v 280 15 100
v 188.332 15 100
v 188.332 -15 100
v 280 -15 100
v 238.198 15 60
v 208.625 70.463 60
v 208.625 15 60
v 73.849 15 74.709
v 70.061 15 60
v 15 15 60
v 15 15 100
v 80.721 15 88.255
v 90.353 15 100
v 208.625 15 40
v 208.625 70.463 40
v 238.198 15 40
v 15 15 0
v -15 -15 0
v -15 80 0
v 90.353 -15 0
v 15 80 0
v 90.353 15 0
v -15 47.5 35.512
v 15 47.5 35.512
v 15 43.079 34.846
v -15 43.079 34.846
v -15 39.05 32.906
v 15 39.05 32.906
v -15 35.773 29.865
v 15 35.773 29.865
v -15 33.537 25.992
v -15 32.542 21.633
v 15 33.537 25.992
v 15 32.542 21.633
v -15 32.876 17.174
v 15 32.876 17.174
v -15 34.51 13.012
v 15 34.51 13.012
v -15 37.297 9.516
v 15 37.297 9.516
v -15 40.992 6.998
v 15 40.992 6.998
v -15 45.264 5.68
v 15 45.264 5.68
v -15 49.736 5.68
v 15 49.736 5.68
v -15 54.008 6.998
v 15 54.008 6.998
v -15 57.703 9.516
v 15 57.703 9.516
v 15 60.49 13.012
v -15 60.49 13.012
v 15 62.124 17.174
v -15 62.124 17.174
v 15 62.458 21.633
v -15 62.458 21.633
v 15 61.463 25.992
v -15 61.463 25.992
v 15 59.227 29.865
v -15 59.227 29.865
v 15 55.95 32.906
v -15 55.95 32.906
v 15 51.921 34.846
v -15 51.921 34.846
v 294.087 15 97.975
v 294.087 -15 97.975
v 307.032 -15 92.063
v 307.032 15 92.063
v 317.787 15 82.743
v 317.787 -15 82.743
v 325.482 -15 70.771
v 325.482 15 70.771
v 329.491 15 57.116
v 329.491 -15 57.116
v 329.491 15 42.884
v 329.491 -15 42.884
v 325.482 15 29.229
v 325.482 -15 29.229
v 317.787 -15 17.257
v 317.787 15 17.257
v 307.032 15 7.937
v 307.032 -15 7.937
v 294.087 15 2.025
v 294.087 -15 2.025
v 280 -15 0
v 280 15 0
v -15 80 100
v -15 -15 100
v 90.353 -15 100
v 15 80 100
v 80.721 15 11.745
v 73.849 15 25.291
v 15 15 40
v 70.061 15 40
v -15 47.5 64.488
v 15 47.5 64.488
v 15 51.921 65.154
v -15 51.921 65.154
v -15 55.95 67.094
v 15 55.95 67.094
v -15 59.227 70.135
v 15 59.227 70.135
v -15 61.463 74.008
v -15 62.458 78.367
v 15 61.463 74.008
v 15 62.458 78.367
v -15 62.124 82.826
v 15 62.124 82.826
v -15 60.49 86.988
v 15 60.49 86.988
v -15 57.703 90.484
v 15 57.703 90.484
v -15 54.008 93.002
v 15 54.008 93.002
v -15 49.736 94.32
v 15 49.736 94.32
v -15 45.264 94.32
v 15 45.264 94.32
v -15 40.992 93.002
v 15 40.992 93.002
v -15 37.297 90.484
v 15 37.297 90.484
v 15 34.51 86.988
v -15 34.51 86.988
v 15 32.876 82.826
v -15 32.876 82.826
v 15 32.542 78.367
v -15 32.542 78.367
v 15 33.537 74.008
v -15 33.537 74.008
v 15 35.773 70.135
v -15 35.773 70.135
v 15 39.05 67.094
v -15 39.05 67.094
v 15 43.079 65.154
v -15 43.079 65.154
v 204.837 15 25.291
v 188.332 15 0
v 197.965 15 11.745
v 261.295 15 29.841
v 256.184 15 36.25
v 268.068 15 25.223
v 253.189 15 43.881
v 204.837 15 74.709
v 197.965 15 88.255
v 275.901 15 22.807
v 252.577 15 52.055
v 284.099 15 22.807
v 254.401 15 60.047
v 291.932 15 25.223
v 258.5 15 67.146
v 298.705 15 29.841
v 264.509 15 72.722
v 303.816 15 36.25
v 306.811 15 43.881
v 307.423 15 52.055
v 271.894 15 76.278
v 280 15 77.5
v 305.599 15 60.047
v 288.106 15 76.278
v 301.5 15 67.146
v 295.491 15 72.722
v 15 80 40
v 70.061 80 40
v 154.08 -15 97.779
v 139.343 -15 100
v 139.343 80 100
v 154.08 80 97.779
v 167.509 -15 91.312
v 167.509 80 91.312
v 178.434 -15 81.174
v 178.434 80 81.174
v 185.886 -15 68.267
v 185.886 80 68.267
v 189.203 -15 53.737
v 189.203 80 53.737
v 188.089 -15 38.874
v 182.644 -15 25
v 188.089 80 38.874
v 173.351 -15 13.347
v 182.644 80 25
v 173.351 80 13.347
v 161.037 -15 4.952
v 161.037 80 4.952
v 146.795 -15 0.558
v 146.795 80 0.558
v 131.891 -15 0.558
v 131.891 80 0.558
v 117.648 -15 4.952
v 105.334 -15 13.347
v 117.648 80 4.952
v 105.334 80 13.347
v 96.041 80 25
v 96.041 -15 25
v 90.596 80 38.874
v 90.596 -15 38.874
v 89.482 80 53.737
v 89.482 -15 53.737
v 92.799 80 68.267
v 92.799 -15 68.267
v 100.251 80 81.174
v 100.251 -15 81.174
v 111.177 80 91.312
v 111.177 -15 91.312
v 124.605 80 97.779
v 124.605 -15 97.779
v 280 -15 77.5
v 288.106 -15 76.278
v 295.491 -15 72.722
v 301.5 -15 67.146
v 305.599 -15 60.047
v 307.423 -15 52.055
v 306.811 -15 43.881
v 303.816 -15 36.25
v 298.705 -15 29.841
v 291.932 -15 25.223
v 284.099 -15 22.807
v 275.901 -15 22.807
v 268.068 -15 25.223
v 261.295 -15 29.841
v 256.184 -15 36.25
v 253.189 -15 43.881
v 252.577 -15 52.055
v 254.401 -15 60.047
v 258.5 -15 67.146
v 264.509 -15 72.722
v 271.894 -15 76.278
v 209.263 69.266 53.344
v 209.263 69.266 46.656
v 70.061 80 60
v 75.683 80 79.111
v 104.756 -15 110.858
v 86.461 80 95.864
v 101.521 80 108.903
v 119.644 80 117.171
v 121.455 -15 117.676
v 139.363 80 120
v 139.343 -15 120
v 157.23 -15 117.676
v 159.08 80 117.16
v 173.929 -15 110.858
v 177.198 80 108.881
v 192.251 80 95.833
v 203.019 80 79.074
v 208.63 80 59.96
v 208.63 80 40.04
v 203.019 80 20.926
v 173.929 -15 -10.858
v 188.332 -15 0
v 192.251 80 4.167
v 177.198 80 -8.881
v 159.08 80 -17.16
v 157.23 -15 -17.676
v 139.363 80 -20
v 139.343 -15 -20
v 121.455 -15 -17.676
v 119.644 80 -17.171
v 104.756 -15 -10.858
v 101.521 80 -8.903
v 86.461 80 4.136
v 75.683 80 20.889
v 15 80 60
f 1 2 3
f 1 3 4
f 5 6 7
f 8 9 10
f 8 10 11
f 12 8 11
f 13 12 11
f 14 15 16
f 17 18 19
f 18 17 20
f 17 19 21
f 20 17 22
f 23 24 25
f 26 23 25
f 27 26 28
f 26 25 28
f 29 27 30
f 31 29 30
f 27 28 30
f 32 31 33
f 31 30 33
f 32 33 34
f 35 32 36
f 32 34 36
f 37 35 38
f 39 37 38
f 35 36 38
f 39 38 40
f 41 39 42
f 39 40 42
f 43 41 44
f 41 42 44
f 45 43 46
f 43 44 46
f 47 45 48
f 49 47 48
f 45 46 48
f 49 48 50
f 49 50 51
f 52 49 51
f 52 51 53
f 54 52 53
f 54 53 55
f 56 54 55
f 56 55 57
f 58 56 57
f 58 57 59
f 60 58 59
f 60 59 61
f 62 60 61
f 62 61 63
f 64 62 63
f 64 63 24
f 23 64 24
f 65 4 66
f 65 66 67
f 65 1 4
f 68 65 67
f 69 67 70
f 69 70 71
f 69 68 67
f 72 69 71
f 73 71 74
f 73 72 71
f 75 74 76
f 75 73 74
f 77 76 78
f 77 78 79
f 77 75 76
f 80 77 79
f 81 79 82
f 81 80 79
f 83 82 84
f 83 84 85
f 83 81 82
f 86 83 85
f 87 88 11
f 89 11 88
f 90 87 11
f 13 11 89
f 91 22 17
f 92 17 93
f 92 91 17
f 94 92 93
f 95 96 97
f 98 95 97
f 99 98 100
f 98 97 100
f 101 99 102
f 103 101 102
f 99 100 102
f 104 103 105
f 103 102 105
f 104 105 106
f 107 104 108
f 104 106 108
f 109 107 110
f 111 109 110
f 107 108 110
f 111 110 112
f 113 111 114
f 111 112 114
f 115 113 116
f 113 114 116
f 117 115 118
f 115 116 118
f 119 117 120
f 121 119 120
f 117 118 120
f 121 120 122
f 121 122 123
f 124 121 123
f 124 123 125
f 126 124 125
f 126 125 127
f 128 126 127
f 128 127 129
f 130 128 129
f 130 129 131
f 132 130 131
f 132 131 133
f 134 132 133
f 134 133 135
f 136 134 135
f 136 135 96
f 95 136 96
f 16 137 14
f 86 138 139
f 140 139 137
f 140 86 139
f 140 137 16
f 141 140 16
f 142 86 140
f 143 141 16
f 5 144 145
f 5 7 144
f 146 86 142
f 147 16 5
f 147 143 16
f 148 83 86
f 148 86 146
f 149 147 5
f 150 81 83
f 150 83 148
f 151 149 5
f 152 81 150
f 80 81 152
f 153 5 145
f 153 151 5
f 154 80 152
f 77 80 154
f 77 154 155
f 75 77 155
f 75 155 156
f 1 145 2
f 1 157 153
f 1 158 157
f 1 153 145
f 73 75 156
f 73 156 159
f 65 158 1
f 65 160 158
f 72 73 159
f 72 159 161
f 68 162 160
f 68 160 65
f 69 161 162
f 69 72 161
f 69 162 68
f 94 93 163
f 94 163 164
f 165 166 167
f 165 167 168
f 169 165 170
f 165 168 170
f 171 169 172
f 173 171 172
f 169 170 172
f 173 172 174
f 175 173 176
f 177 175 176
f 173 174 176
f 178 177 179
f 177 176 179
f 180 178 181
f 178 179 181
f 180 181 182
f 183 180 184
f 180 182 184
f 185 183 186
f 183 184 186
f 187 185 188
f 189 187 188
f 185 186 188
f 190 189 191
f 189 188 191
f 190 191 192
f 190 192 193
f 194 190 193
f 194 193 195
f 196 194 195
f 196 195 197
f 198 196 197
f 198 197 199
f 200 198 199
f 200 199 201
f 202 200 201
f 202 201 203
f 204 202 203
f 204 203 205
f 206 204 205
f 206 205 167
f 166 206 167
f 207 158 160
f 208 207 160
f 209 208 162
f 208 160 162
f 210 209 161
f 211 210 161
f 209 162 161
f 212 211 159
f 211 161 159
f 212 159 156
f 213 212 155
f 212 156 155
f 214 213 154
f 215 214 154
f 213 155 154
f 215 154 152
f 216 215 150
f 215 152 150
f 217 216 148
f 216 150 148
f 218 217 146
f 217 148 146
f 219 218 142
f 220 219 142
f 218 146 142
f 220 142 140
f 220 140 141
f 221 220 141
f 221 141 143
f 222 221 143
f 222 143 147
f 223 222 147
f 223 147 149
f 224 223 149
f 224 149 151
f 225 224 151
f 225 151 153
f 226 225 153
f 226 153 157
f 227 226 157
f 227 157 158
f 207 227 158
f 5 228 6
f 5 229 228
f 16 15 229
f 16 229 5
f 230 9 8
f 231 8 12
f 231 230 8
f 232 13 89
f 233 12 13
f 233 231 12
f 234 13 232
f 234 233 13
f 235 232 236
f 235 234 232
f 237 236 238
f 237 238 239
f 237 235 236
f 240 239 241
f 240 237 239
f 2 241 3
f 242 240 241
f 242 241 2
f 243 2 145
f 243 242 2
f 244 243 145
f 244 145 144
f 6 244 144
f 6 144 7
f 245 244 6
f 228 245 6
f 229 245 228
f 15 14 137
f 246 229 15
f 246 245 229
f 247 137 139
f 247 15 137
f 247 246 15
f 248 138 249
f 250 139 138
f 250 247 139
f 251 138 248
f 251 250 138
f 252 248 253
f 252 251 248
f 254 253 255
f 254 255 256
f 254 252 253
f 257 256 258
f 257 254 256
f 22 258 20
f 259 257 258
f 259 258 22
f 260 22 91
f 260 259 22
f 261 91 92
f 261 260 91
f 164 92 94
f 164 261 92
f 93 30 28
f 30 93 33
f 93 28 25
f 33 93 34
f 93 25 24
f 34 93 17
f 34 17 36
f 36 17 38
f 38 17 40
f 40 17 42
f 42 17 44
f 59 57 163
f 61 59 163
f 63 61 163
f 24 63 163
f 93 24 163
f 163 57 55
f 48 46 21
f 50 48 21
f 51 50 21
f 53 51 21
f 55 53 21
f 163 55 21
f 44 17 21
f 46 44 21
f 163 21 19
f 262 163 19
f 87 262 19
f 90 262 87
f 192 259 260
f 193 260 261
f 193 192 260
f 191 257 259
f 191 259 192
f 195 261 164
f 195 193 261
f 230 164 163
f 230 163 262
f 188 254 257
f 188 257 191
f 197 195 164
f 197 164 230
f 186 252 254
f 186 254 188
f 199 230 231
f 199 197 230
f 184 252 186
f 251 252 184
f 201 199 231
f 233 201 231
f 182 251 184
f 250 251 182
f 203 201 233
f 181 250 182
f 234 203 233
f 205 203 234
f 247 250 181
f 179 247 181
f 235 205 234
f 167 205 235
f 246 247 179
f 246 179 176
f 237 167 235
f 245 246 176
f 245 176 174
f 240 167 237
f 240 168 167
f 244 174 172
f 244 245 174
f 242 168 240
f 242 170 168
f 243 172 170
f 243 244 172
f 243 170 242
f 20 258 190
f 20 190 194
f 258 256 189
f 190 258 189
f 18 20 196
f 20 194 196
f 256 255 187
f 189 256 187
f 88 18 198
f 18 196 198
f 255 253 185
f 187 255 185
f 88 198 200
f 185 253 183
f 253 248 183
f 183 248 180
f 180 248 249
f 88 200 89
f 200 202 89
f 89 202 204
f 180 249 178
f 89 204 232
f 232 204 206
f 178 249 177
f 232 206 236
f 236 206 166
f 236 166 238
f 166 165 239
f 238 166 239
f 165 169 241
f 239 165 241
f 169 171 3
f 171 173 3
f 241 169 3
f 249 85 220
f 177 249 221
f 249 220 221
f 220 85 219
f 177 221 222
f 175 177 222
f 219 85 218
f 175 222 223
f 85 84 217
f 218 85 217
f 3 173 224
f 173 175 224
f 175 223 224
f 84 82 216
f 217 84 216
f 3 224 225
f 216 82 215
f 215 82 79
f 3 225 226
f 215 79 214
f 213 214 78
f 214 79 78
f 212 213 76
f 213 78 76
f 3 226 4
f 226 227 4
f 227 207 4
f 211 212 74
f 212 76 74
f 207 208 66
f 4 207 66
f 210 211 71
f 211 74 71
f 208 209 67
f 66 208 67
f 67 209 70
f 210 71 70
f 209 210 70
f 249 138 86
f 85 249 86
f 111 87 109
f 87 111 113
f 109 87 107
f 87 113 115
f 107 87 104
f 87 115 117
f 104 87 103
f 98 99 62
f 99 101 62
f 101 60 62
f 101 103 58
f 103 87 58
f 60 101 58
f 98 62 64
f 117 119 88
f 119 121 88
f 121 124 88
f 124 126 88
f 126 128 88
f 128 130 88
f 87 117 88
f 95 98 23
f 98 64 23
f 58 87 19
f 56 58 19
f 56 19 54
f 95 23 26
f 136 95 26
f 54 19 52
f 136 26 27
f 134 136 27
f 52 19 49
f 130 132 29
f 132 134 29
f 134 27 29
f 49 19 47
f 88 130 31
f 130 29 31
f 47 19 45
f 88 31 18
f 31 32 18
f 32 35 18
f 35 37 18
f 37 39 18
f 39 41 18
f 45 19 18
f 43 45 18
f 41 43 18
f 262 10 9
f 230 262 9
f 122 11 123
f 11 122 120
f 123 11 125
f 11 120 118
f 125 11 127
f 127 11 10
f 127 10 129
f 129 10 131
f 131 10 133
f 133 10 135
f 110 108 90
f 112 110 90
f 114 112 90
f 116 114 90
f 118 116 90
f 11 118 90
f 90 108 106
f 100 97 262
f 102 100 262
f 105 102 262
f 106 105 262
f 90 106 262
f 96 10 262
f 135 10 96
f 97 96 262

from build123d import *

# Parameters (mm, degrees)
EXTRUDE_THIN1_DEPTH      = 100
SKETCH2_W                = 50
SKETCH2_H                = 30
REVOLVE1_ANGLE           = 180
SKETCH3_R                = 27.5
CUT_EXTRUDE1_DEPTH       = 351.89172119
CUT_EXTRUDE1_DEPTH_BACK  = 351.89172119
SKETCH4_R                = 70
BOSS_EXTRUDE1_DEPTH      = 65
BOSS_EXTRUDE1_DEPTH_BACK = 30
SKETCH5_R                = 50
CUT_EXTRUDE2_DEPTH       = 364.765034054
SKETCH6_R                = 15
CUT_EXTRUDE3_DEPTH       = 347.446244026
RIB1_REACH               = 348.699
SKETCH8_WALL_W           = 749.740096374
SKETCH8_WALL_H           = 20
RIB23_REACH              = 348.699
SKETCH15_WALL_W          = 778.361425474
SKETCH15_WALL_H          = 20


with BuildPart() as part:
    # Sketch1 → Extrude-Thin1 (new body)
    with BuildSketch(Plane.XY):
        Polygon((-15, 80), (-15, -15), (280, -15), (280, 15), (15, 15), (15, 80), align=None)
    extrude(amount=EXTRUDE_THIN1_DEPTH)

    # Sketch2 → Revolve1 (revolve)
    with BuildSketch(Plane(origin=(280, 0, 0), x_dir=(0, 0, -1), z_dir=(1, 0, 0))):
        with Locations((-75, 0)):
            Rectangle(SKETCH2_W, SKETCH2_H)
    revolve(axis=Axis((280, 15, 50), (0, 1, 0)), revolution_arc=REVOLVE1_ANGLE)

    # Sketch3 → Cut-Extrude1 (cut, two sides)
    with BuildSketch(Plane(origin=(0, 15, 0), x_dir=(1, 0, 0), z_dir=(0, 1, 0))) as cut_extrude1_sk:
        with Locations(Location((280, -50, 0), (0, 0, 270))):
            Circle(SKETCH3_R)
    extrude(amount=CUT_EXTRUDE1_DEPTH, mode=Mode.SUBTRACT)
    extrude(cut_extrude1_sk.sketch, amount=-CUT_EXTRUDE1_DEPTH_BACK, mode=Mode.SUBTRACT)

    # Sketch4 → Boss-Extrude1 (add, two sides)
    with BuildSketch(Plane(origin=(0, 15, 0), x_dir=(1, 0, 0), z_dir=(0, 1, 0))) as boss_extrude1_sk:
        with Locations(Location((139.34266344, -50, 0), (0, 0, 270))):
            Circle(SKETCH4_R)
    extrude(amount=BOSS_EXTRUDE1_DEPTH)
    extrude(boss_extrude1_sk.sketch, amount=-BOSS_EXTRUDE1_DEPTH_BACK)

    # Sketch5 → Cut-Extrude2 (cut, through all)
    with BuildSketch(Plane(origin=(0, 80, 0), x_dir=(1, 0, 0), z_dir=(0, 1, 0))):
        with Locations(Location((139.34266344, -50, 0), (0, 0, 270))):
            Circle(SKETCH5_R)
    extrude(amount=-CUT_EXTRUDE2_DEPTH, mode=Mode.SUBTRACT)

    # Sketch6 → Cut-Extrude3 (cut, through all)
    with BuildSketch(Plane(origin=(15, 0, 0), x_dir=(0, 0, -1), z_dir=(1, 0, 0))):
        with Locations((-79.487733911, 47.5)):
            Circle(SKETCH6_R)
        with Locations(Location((-20.512266089, 47.5, 0), (0, 0, 180))):
            Circle(SKETCH6_R)
    extrude(amount=-CUT_EXTRUDE3_DEPTH, mode=Mode.SUBTRACT)

    # Sketch8 wall → Rib1 (add, up to next)
    with BuildSketch(Plane(origin=(42.17133172, 80, 50), x_dir=(1, 0, 0), z_dir=(0, 1, 0)), mode=Mode.PRIVATE) as rib1_sk1:
        Rectangle(SKETCH8_WALL_W, SKETCH8_WALL_H)
    rib1_tool1 = extrude(rib1_sk1.sketch, amount=-RIB1_REACH, mode=Mode.PRIVATE) - part.part
    add(rib1_tool1.solids().sort_by_distance((42.17133172, 80, 50))[0])

    # Sketch15 wall → Rib23 (add, up to next)
    with BuildSketch(Plane(origin=(223.056644771, 43.396320835, 50), x_dir=(0.470501542113, -0.88239917207, 0), z_dir=(0.88239917207, 0.470501542113, 0)), mode=Mode.PRIVATE) as rib23_sk1:
        Rectangle(SKETCH15_WALL_W, SKETCH15_WALL_H)
    rib23_tool1 = extrude(rib23_sk1.sketch, amount=-RIB23_REACH, mode=Mode.PRIVATE) - part.part
    add(rib23_tool1.solids().sort_by_distance((223.056644771, 43.396320835, 50))[0])


solid = part.part
